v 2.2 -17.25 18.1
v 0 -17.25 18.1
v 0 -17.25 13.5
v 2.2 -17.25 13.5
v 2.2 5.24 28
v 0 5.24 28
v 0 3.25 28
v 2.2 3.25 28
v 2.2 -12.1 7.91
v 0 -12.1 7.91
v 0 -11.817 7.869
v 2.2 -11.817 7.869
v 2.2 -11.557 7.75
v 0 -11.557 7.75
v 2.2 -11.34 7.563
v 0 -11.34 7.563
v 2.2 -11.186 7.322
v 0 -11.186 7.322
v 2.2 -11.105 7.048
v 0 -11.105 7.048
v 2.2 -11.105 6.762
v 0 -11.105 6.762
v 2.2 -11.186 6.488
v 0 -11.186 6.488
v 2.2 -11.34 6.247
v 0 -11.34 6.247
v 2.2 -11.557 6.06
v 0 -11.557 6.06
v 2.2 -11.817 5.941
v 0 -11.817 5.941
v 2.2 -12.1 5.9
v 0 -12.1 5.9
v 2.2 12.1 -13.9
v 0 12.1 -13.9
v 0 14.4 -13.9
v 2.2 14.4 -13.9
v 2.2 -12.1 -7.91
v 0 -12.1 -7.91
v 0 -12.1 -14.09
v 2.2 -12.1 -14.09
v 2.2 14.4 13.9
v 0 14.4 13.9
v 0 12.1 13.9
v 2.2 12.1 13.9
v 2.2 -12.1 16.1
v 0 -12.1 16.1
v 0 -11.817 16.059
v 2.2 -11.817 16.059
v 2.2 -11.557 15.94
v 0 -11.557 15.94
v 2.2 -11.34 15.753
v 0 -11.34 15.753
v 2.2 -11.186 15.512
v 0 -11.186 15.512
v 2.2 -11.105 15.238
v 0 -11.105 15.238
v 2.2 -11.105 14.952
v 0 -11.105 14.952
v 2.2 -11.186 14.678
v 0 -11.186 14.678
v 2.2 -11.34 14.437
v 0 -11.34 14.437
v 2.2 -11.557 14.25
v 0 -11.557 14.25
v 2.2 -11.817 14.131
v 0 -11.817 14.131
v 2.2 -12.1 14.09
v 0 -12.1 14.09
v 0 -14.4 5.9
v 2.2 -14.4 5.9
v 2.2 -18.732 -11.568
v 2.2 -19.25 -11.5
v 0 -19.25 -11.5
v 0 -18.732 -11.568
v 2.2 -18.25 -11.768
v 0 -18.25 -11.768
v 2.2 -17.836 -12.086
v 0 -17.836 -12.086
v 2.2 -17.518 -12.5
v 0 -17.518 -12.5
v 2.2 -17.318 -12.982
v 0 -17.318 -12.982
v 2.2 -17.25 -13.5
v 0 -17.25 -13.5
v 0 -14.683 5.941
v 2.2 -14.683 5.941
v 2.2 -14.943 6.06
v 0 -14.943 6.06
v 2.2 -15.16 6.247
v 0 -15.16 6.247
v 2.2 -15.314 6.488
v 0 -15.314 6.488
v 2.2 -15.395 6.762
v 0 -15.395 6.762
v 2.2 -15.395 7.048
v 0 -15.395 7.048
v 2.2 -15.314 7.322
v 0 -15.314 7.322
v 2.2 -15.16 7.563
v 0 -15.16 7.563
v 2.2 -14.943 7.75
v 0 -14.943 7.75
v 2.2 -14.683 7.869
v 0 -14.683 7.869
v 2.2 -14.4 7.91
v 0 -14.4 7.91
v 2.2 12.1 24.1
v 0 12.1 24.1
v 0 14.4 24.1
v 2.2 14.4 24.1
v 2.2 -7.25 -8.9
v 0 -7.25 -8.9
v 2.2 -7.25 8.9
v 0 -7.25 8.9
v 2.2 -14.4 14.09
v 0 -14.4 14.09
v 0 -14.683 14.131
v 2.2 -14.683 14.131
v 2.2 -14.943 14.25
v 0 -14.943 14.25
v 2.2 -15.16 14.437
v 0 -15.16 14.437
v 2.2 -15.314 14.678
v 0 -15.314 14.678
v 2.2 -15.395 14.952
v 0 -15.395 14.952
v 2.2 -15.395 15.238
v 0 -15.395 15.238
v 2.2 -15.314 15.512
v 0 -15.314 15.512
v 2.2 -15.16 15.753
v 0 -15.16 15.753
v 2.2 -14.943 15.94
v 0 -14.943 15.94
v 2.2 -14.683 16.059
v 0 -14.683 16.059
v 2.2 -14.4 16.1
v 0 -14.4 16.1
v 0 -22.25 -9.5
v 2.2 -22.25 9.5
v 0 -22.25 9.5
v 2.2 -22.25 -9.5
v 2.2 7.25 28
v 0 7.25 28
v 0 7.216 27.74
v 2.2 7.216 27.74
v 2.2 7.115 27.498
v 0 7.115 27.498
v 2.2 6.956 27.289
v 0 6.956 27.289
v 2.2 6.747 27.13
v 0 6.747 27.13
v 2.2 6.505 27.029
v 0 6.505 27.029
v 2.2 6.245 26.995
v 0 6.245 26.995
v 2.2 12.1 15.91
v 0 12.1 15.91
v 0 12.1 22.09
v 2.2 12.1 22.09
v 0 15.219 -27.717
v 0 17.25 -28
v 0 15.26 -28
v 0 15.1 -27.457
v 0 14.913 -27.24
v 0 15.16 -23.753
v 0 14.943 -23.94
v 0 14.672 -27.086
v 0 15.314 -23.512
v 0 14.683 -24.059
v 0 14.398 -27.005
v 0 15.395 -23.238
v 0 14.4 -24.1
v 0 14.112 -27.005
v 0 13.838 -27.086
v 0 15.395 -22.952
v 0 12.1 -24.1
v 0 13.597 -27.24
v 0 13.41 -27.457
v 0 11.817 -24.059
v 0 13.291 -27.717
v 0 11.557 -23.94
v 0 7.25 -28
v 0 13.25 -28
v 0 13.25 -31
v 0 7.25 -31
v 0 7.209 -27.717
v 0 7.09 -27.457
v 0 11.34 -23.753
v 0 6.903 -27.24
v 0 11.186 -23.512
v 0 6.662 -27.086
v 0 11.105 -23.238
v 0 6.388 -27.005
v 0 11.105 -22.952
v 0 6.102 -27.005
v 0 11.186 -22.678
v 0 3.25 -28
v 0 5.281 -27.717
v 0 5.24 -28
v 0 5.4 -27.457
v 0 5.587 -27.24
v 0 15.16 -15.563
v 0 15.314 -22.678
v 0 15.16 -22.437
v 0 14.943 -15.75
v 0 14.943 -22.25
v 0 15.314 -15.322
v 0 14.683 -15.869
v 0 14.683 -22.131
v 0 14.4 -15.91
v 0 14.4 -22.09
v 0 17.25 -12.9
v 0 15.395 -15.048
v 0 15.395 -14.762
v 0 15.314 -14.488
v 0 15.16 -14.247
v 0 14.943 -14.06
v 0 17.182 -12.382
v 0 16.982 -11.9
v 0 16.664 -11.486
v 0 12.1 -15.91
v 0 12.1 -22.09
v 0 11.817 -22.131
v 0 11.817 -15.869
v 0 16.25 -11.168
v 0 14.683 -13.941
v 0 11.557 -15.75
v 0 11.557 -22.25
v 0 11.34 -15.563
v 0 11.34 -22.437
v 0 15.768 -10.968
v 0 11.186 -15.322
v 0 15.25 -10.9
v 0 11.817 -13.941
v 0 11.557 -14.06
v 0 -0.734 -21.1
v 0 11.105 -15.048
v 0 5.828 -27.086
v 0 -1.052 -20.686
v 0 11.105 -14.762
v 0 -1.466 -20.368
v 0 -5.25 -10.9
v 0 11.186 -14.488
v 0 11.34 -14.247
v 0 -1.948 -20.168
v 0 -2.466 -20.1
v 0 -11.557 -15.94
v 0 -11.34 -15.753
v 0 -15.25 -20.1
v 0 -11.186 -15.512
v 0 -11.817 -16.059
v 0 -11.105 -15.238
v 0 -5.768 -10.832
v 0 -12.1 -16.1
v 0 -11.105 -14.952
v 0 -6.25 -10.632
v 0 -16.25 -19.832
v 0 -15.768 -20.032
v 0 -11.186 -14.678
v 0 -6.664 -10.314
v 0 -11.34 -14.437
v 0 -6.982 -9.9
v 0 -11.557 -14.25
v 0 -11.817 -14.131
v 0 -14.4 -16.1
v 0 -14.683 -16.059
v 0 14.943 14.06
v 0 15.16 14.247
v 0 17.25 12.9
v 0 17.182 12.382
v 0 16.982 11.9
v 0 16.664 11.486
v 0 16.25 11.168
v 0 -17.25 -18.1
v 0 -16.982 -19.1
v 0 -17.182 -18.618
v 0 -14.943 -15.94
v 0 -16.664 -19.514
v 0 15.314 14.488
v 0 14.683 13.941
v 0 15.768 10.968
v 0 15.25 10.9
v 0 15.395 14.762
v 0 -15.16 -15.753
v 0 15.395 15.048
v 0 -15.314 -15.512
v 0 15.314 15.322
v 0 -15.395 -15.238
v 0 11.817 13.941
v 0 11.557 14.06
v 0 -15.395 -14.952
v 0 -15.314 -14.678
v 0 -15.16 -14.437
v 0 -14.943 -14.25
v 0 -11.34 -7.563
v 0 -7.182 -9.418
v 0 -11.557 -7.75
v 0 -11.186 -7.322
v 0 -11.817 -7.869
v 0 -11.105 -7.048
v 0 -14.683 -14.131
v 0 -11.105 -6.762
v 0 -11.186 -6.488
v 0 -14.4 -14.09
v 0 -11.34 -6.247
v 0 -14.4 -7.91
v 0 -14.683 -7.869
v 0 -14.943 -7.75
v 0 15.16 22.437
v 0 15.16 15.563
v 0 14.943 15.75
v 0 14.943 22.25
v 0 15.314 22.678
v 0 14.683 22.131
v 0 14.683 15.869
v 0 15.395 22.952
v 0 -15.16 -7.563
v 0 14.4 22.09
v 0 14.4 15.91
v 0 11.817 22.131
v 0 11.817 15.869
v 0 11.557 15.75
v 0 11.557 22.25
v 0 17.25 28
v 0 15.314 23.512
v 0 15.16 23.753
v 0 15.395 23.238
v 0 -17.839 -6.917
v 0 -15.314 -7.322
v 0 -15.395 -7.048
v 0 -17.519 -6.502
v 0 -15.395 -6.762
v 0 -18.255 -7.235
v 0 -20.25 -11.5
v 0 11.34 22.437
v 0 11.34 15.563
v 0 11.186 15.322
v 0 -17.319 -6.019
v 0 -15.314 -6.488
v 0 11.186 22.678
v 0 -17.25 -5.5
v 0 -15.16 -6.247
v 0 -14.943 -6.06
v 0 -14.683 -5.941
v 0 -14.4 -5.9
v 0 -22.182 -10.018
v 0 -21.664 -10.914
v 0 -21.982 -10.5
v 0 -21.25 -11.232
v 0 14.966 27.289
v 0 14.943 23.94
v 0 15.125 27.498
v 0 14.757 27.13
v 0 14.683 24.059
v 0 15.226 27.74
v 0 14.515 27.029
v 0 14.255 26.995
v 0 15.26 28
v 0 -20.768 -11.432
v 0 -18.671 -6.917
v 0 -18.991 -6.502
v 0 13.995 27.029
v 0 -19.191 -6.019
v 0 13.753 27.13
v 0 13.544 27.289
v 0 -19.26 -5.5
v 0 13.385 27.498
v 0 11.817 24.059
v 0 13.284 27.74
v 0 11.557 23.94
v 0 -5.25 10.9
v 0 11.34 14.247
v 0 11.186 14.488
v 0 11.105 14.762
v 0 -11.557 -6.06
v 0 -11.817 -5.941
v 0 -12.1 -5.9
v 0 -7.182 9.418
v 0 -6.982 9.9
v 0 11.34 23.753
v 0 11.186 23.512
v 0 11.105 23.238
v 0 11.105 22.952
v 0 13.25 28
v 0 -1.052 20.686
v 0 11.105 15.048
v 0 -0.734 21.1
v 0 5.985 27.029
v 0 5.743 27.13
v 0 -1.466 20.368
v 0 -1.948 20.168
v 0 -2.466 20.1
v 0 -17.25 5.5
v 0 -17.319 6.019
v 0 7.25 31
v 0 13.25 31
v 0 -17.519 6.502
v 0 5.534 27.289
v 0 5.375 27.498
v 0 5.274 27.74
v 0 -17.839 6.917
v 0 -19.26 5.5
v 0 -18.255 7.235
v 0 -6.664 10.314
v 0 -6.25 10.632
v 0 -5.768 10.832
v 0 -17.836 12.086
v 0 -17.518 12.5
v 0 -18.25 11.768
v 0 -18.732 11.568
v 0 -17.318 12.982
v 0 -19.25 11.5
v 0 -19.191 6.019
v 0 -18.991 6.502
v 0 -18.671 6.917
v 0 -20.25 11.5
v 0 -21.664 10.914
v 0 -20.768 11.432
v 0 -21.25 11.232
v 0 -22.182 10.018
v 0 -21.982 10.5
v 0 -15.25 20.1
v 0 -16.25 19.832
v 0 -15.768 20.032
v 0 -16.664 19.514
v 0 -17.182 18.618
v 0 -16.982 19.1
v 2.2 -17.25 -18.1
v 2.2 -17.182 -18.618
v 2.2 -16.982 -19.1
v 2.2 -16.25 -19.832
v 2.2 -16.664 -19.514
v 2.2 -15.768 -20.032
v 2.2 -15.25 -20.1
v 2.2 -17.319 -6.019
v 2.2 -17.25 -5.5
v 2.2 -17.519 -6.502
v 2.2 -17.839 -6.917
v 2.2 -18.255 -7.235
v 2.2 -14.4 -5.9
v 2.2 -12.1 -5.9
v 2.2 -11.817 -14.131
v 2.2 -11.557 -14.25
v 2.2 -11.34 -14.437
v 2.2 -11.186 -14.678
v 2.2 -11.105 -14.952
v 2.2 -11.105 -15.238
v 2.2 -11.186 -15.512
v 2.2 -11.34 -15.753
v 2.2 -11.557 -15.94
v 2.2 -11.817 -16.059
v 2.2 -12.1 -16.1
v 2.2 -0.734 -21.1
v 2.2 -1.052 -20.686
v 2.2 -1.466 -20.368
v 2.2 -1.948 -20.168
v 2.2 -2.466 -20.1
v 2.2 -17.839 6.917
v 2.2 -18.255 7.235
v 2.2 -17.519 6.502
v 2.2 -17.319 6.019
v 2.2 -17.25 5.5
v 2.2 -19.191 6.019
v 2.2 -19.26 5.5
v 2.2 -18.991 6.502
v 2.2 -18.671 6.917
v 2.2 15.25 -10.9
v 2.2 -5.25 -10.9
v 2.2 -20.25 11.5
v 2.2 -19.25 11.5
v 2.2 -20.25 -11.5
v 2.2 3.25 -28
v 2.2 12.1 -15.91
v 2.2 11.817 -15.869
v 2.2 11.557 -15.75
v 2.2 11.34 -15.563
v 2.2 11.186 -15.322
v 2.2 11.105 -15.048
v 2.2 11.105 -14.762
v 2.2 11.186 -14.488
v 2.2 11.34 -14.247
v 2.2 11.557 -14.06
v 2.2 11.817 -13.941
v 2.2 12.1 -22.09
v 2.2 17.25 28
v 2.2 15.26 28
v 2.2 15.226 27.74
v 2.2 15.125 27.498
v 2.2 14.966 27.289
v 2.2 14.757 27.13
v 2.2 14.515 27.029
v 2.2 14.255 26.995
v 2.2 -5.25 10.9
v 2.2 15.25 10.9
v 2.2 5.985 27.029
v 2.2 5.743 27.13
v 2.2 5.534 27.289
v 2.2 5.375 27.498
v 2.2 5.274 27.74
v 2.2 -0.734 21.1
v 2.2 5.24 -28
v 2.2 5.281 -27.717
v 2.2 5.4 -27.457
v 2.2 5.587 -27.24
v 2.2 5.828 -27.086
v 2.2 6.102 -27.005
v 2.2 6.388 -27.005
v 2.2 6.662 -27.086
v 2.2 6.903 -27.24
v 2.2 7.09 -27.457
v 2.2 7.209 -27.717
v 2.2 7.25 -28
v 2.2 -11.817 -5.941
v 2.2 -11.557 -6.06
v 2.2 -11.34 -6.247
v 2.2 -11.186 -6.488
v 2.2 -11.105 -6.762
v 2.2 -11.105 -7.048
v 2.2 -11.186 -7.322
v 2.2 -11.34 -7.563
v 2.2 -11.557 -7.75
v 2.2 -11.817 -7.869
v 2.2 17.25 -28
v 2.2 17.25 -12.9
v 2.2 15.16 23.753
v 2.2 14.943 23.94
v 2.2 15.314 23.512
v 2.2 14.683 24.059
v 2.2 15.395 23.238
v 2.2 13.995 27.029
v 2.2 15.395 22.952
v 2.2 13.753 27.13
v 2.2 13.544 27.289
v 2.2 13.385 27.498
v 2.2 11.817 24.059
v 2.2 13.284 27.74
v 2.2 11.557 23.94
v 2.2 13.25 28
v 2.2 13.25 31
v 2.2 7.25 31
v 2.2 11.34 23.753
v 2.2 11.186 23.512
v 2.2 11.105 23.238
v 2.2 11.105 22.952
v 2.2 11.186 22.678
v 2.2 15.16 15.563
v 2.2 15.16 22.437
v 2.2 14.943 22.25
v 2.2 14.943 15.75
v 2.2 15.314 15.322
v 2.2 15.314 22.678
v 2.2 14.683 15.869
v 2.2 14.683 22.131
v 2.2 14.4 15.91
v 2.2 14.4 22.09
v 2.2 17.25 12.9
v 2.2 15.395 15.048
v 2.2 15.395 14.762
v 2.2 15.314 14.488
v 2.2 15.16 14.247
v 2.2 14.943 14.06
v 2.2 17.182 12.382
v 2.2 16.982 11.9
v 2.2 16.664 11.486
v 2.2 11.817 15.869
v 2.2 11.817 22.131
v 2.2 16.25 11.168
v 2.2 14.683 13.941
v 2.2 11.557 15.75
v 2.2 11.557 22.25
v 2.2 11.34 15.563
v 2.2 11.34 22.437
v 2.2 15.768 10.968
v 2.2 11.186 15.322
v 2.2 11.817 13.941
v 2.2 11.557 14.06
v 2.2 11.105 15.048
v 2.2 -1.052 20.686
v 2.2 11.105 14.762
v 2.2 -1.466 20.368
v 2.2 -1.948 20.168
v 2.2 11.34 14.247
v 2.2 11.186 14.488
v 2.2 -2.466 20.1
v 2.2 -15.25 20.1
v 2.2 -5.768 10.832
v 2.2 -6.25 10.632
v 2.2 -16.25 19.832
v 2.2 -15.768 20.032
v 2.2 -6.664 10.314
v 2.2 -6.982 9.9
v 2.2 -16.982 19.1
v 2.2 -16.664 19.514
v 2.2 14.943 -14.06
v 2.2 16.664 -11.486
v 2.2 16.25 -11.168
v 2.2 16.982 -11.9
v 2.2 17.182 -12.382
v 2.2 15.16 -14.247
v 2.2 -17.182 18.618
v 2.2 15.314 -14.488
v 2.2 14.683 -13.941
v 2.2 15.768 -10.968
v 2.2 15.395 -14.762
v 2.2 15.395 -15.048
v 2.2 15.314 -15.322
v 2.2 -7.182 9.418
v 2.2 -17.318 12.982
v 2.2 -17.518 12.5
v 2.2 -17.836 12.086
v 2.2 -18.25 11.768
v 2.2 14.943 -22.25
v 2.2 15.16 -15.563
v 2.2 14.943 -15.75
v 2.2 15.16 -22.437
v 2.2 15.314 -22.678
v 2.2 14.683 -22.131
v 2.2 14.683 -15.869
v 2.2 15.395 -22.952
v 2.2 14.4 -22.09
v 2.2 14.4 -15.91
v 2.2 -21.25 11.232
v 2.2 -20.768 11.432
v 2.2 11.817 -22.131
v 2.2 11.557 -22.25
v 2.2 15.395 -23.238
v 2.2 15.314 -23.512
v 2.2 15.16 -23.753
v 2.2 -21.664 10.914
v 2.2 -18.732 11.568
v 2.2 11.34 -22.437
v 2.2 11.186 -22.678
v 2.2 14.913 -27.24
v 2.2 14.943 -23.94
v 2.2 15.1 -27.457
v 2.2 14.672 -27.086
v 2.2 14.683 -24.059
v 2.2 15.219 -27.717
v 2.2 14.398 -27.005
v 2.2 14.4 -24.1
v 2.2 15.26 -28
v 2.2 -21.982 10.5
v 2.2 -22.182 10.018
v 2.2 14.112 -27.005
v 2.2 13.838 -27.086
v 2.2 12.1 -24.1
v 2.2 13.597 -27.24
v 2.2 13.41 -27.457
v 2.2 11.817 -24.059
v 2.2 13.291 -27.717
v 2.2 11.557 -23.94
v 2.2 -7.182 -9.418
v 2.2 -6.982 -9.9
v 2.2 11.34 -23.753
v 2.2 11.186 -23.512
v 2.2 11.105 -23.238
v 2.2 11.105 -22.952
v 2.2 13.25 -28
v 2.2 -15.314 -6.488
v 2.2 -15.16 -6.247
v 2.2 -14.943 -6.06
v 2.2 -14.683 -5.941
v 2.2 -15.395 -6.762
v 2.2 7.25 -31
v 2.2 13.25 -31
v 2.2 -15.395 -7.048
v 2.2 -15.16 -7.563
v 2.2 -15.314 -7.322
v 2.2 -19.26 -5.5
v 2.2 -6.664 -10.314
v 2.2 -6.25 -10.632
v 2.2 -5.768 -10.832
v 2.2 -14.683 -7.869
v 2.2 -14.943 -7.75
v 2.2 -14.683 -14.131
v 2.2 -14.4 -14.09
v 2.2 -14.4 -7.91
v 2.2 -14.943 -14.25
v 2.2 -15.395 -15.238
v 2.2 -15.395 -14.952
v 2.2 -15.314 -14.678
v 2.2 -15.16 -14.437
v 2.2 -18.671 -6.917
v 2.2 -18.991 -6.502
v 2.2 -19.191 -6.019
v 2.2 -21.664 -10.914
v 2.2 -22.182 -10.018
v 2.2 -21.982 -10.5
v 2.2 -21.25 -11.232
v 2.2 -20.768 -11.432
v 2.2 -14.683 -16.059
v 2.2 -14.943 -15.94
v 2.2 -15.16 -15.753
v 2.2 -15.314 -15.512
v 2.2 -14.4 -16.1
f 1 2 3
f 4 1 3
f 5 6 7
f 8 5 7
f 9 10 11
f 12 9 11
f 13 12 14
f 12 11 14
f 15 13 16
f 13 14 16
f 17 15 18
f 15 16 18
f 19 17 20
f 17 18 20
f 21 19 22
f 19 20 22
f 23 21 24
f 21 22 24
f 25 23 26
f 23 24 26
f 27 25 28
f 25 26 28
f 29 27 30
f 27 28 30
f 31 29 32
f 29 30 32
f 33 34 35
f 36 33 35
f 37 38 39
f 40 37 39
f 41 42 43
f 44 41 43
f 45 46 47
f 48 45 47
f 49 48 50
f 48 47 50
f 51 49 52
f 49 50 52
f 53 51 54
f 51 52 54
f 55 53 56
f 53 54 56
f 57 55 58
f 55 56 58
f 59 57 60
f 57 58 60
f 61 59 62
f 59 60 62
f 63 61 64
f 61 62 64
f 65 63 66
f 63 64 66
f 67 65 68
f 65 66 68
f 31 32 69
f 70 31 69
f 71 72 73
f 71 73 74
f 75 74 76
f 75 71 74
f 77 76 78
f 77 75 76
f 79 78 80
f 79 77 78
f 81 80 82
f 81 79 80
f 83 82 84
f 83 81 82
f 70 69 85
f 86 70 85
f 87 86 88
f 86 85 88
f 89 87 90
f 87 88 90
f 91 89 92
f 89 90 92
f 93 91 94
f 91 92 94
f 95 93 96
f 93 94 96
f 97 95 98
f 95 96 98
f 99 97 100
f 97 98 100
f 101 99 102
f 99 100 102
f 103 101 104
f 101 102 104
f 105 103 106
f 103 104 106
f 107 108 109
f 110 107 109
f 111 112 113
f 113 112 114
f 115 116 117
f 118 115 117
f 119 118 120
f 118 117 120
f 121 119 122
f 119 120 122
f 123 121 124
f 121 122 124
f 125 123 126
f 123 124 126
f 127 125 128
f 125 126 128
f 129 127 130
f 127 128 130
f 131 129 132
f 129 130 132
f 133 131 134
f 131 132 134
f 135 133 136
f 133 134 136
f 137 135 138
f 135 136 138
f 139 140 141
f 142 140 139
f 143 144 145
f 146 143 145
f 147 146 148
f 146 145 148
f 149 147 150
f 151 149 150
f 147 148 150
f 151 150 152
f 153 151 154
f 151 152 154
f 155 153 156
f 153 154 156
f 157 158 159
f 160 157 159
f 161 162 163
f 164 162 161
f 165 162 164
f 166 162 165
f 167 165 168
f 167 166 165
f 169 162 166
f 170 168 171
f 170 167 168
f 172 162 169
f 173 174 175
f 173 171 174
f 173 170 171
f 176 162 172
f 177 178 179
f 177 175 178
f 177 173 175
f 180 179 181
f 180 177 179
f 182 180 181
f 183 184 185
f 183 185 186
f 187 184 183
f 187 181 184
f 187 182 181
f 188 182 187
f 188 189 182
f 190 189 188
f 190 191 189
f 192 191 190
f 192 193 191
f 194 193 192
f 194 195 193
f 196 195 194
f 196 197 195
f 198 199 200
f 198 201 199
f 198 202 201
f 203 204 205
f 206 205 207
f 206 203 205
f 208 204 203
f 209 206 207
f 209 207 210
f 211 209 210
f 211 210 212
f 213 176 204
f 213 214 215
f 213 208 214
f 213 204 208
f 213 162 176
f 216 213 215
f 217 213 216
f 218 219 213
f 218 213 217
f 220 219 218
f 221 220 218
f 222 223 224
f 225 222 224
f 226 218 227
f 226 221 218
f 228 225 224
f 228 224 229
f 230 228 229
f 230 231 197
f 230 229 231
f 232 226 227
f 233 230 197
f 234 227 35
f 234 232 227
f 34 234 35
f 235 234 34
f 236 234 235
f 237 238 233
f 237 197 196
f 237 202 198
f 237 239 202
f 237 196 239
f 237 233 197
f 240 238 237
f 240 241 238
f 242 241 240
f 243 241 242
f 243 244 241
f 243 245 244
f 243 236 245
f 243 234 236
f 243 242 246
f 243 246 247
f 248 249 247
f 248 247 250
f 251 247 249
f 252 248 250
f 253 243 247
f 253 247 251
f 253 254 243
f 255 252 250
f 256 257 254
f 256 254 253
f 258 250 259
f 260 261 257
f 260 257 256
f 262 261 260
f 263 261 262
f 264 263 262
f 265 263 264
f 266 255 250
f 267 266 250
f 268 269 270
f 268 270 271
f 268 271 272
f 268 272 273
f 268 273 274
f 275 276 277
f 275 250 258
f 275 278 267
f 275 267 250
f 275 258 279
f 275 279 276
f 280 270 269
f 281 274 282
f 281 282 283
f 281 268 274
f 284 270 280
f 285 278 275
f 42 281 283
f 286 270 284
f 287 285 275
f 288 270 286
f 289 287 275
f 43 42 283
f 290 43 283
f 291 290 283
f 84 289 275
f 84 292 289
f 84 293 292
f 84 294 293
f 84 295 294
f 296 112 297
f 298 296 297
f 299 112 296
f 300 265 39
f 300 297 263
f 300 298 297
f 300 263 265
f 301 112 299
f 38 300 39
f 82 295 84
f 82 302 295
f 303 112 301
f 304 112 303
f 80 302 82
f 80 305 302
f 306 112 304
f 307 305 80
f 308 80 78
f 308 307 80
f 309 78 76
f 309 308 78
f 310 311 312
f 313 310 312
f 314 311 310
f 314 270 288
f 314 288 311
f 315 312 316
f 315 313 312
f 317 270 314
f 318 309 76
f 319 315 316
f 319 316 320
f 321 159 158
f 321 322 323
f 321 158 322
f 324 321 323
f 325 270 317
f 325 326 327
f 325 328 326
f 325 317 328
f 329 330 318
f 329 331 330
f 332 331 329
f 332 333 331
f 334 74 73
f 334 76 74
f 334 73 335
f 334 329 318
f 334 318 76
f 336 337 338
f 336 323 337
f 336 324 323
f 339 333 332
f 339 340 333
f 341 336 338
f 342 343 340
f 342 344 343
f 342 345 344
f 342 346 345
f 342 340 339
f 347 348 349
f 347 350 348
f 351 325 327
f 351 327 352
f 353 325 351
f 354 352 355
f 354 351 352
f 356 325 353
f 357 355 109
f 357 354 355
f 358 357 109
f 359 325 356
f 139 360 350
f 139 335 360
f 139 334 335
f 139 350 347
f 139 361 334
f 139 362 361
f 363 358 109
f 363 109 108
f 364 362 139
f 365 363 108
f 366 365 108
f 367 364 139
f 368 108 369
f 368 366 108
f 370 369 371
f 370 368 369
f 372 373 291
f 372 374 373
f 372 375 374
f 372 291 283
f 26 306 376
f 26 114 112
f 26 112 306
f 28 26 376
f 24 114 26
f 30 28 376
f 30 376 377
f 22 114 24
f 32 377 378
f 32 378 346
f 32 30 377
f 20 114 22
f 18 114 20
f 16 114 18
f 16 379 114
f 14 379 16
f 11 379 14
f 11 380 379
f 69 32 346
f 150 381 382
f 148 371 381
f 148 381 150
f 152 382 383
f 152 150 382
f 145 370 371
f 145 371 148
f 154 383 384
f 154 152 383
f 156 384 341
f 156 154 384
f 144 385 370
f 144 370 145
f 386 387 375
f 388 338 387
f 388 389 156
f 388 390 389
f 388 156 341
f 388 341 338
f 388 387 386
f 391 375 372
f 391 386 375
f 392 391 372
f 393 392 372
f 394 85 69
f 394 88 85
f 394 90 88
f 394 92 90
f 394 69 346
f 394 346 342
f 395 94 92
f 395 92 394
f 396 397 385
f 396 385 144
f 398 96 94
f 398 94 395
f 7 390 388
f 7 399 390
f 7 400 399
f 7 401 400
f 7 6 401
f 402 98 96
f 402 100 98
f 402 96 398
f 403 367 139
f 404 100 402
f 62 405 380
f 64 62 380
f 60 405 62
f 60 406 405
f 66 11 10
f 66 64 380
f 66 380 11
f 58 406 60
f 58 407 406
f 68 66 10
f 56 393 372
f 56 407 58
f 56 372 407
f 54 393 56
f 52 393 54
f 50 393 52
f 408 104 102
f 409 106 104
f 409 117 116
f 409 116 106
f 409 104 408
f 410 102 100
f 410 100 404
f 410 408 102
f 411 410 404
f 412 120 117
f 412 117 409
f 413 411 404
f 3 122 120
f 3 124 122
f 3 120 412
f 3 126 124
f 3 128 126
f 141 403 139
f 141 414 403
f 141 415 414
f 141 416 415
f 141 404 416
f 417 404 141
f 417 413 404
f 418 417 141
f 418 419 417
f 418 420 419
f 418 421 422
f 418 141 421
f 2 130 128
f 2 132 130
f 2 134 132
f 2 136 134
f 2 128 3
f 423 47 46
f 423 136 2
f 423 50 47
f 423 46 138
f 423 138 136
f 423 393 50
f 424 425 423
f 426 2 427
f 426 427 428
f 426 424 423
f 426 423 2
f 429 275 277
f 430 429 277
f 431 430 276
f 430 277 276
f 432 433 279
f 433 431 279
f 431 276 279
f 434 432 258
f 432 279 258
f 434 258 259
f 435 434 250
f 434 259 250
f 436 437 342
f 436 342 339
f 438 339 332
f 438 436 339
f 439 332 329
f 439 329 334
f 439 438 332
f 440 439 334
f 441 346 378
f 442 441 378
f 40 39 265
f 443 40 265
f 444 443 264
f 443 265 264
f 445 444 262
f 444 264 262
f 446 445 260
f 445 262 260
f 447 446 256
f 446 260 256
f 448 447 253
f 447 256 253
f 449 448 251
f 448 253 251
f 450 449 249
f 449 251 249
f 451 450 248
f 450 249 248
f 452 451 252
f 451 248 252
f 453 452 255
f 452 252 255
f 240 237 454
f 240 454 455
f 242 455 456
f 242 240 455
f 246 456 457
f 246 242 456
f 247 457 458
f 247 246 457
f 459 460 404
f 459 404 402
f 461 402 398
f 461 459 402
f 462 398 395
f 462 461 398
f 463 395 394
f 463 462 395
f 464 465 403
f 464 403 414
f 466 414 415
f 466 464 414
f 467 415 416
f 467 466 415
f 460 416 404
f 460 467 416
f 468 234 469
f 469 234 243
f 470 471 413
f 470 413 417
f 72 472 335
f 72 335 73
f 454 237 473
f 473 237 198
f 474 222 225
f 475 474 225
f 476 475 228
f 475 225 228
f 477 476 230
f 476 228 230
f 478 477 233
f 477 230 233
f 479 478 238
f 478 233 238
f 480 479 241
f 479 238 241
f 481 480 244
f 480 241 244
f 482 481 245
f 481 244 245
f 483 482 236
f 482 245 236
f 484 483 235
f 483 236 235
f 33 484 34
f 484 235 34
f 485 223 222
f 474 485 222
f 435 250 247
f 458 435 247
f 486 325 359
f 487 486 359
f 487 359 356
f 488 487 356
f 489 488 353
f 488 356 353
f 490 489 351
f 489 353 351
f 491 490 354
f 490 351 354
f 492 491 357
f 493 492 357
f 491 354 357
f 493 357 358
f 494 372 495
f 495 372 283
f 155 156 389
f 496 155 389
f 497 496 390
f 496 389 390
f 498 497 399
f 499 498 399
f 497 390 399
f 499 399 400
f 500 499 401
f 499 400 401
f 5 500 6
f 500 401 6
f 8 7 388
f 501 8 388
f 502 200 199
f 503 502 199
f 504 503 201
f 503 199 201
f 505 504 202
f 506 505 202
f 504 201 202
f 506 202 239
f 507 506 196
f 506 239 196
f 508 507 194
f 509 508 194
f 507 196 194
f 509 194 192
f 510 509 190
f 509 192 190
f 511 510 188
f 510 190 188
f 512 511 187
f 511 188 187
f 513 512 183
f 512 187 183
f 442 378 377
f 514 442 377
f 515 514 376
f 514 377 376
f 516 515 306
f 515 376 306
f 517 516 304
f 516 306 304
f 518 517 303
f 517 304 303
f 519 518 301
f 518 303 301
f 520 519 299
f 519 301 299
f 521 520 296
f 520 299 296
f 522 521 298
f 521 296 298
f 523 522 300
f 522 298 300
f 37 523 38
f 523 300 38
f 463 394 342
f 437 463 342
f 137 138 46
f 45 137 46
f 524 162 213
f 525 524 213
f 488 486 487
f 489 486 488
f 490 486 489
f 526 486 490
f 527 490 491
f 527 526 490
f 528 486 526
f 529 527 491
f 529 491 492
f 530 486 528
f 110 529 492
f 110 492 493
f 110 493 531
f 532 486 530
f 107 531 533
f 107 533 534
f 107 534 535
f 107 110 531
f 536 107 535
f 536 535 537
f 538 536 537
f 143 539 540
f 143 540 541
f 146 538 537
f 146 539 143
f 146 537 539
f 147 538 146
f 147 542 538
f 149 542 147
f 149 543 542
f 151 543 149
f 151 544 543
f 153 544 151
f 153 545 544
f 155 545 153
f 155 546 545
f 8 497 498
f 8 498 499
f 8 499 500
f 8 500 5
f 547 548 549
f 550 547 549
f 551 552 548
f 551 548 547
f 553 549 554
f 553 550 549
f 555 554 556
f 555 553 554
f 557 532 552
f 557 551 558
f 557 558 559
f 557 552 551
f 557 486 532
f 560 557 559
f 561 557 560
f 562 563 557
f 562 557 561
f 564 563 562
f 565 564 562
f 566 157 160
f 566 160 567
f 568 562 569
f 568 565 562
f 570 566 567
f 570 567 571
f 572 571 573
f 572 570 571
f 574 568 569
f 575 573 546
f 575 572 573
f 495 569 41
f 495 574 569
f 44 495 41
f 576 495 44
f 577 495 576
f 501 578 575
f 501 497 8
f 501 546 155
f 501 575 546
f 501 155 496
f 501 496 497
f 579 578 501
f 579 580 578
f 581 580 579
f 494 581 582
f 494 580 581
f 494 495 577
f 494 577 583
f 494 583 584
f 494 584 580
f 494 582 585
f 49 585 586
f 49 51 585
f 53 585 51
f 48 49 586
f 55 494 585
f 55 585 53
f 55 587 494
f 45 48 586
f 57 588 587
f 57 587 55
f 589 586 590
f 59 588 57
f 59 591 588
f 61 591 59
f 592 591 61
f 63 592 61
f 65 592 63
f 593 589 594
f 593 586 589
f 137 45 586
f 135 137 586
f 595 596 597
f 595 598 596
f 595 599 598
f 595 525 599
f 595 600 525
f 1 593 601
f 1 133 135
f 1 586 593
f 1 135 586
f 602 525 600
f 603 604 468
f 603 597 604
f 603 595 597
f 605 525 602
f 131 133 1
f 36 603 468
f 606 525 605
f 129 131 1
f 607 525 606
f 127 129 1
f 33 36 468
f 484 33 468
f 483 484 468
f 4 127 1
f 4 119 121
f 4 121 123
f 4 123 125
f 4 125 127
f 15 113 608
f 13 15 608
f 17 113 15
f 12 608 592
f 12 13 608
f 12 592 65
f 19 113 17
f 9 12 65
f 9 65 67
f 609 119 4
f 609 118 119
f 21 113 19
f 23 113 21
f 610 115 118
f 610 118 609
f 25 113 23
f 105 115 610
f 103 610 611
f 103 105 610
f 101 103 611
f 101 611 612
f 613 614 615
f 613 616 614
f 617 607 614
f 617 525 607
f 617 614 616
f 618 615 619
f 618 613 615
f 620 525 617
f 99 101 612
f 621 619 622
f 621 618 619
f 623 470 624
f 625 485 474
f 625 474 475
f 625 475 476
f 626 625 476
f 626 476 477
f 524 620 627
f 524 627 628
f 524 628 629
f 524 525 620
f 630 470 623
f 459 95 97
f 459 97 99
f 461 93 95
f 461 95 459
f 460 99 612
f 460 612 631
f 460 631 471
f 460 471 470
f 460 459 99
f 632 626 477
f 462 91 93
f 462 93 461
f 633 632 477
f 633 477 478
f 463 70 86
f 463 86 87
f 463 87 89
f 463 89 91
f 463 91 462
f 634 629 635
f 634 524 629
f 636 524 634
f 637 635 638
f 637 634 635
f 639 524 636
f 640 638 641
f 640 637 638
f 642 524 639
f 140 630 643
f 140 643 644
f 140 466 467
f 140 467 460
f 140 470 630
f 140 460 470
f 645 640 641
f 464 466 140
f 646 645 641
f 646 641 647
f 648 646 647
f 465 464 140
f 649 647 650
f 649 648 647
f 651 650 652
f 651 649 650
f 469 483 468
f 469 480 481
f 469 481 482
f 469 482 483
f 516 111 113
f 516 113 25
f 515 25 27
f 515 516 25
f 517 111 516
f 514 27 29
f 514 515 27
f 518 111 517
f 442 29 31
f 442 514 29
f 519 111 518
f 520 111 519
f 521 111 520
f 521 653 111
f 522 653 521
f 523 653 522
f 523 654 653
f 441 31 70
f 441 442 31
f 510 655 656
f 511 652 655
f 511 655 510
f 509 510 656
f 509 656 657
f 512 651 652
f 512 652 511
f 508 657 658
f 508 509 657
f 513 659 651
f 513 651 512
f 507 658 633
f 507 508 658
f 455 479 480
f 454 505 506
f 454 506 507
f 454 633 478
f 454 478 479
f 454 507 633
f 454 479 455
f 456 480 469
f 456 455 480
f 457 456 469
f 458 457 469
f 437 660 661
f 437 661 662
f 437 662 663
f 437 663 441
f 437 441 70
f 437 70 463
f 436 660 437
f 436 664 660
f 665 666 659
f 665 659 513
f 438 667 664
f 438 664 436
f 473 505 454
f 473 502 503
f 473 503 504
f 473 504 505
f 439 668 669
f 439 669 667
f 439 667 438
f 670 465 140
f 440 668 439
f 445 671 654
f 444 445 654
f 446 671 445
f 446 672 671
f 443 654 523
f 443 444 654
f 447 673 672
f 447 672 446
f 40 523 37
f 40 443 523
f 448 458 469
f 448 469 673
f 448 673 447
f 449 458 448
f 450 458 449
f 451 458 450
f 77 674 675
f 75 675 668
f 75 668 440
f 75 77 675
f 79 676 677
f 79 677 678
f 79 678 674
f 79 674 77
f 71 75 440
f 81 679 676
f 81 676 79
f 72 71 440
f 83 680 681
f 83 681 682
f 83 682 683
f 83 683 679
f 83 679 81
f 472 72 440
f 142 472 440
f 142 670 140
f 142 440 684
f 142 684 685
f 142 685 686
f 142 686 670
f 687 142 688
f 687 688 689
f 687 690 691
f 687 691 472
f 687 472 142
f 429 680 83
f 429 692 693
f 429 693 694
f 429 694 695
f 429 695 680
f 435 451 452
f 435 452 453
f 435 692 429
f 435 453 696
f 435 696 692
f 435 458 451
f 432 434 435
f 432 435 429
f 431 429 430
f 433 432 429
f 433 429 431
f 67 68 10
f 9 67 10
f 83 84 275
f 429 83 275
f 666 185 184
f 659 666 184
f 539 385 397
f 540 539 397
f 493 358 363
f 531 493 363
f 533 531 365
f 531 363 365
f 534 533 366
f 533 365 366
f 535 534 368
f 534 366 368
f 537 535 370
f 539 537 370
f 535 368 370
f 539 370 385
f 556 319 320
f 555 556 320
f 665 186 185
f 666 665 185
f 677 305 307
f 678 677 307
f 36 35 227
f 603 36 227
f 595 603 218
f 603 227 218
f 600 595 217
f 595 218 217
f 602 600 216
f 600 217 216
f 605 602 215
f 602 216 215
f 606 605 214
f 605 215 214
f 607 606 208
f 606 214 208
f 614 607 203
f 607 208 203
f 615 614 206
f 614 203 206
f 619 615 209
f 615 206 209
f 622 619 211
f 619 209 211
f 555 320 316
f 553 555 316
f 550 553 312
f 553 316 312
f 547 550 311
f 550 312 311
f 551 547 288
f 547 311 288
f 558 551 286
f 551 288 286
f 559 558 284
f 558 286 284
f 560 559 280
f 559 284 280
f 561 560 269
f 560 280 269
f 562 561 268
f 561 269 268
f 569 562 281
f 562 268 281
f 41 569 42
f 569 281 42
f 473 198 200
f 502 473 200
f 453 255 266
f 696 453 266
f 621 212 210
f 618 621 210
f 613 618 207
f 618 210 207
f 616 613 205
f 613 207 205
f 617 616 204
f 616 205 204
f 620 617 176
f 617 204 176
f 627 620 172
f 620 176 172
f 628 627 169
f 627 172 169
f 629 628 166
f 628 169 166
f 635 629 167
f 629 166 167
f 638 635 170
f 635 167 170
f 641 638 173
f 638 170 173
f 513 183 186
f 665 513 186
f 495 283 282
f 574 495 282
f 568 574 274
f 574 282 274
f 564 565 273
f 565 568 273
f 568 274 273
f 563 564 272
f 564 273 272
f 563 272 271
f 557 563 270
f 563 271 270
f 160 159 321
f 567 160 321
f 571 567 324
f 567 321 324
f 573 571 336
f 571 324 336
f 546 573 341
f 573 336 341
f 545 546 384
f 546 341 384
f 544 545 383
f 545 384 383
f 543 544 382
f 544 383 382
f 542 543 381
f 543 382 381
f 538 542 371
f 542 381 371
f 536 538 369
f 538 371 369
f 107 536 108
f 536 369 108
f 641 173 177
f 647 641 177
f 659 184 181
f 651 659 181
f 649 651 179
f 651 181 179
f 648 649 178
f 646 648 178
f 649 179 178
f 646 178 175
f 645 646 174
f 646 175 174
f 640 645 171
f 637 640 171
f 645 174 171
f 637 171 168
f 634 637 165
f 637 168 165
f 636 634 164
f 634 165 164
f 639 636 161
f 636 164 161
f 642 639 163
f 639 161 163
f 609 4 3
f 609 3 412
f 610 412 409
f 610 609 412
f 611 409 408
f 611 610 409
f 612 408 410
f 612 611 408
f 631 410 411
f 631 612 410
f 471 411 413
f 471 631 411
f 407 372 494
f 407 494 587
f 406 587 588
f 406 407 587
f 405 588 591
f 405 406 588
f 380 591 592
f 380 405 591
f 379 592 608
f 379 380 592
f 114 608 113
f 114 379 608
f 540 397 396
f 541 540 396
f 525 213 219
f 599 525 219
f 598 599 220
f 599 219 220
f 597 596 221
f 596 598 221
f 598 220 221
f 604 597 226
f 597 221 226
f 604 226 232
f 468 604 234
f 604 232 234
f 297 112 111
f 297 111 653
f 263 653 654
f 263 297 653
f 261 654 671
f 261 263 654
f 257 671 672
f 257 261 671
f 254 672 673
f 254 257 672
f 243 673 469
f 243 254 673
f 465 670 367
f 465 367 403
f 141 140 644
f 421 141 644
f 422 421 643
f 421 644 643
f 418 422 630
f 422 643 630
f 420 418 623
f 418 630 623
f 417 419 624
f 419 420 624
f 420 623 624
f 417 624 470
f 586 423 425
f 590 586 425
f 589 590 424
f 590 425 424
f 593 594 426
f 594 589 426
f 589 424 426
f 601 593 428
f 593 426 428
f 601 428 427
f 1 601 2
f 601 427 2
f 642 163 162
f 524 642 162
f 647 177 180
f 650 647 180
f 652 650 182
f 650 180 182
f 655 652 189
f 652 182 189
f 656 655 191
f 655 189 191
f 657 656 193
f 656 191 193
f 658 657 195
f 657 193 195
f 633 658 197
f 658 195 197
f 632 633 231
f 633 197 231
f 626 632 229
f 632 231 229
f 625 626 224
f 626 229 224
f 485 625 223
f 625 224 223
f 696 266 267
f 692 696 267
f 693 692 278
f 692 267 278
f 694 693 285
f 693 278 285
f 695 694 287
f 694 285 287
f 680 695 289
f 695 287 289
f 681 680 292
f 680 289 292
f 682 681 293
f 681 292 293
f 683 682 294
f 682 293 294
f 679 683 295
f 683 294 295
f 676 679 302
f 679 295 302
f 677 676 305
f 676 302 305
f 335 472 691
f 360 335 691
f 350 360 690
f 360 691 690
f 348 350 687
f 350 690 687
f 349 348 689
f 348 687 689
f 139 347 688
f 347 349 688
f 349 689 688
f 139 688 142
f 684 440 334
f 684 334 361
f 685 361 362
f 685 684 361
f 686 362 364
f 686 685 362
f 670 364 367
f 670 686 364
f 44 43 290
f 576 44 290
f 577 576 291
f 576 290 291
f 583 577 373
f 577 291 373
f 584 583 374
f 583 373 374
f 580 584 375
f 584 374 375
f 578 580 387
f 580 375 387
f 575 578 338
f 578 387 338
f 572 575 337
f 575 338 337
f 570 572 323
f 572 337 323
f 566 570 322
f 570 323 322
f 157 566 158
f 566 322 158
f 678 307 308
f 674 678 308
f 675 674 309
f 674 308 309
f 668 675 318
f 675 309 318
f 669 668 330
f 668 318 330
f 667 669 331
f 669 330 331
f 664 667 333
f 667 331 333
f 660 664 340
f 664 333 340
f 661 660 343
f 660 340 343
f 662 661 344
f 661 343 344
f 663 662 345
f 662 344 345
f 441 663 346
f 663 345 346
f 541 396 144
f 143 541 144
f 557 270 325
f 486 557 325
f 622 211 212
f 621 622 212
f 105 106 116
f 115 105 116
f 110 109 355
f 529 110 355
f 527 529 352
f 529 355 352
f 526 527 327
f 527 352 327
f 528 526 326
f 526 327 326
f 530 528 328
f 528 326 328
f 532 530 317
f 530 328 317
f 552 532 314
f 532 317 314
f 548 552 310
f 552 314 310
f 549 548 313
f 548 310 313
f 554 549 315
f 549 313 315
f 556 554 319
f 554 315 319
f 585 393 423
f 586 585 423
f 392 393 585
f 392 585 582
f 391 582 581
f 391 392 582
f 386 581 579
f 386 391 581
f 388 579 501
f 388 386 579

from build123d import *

# Parameters (mm, degrees)
EXTRUDE_1_DEPTH = 2.2
EXTRUDE_2_DEPTH = 2.2
FILLET_1_R      = 2


with BuildPart() as part:
    # 草图1 → 凸台-拉伸1 (new body)
    with BuildSketch(Plane(origin=(0, 0, 0), x_dir=(0, 0, -1), z_dir=(1, 0, 0))):
        with BuildLine():
            Line((-20.1, -17.25), (20.1, -17.25))
            Line((20.1, -17.25), (20.1, -1.311067127))
            Line((20.1, -1.311067127), (28, 3.25))
            Line((28, 3.25), (28, 5.24))
            ThreePointArc((28, 5.24), (26.995, 6.245), (28, 7.25))
            Line((28, 7.25), (31, 7.25))
            Line((31, 7.25), (31, 13.25))
            Line((31, 13.25), (28, 13.25))
            ThreePointArc((28, 13.25), (26.995, 14.255), (28, 15.26))
            Line((28, 15.26), (28, 17.25))
            Line((28, 17.25), (10.9, 17.25))
            Line((10.9, 17.25), (10.9, -7.25))
            Line((10.9, -7.25), (-10.9, -7.25))
            Line((-10.9, -7.25), (-10.9, 17.25))
            Line((-10.9, 17.25), (-28, 17.25))
            Line((-28, 17.25), (-28, 15.26))
            ThreePointArc((-28, 15.26), (-27.289357685, 14.965642315), (-26.995, 14.255))
            ThreePointArc((-26.995, 14.255), (-27.289357685, 13.544357685), (-28, 13.25))
            Line((-28, 13.25), (-31, 13.25))
            Line((-31, 13.25), (-31, 7.25))
            Line((-31, 7.25), (-28, 7.25))
            ThreePointArc((-28, 7.25), (-27.289357685, 6.955642315), (-26.995, 6.245))
            ThreePointArc((-26.995, 6.245), (-27.289357685, 5.534357685), (-28, 5.24))
            Line((-28, 5.24), (-28, 3.25))
            Line((-28, 3.25), (-20.1, -1.311067127))
            Line((-20.1, -1.311067127), (-20.1, -17.25))
        make_face()
        with BuildLine():
            Line((-7.91, -14.4), (-14.09, -14.4))
            ThreePointArc((-14.09, -14.4), (-15.095, -15.405), (-16.1, -14.4))
            Line((-16.1, -14.4), (-16.1, -12.1))
            ThreePointArc((-16.1, -12.1), (-15.095, -11.095), (-14.09, -12.1))
            Line((-14.09, -12.1), (-7.91, -12.1))
            ThreePointArc((-7.91, -12.1), (-6.905, -11.095), (-5.9, -12.1))
            Line((-5.9, -12.1), (-5.9, -14.4))
            ThreePointArc((-5.9, -14.4), (-6.905, -15.405), (-7.91, -14.4))
        make_face(mode=Mode.SUBTRACT)
        with BuildLine():
            Line((16.1, -12.1), (16.1, -14.4))
            ThreePointArc((16.1, -14.4), (15.095, -15.405), (14.09, -14.4))
            Line((14.09, -14.4), (7.91, -14.4))
            ThreePointArc((7.91, -14.4), (6.905, -15.405), (5.9, -14.4))
            Line((5.9, -14.4), (5.9, -12.1))
            ThreePointArc((5.9, -12.1), (6.905, -11.095), (7.91, -12.1))
            Line((7.91, -12.1), (14.09, -12.1))
            ThreePointArc((14.09, -12.1), (15.095, -11.095), (16.1, -12.1))
        make_face(mode=Mode.SUBTRACT)
        with BuildLine():
            Line((-15.91, 12.1), (-22.09, 12.1))
            ThreePointArc((-22.09, 12.1), (-23.095, 11.095), (-24.1, 12.1))
            Line((-24.1, 12.1), (-24.1, 14.4))
            ThreePointArc((-24.1, 14.4), (-23.095, 15.405), (-22.09, 14.4))
            Line((-22.09, 14.4), (-15.91, 14.4))
            ThreePointArc((-15.91, 14.4), (-14.905, 15.405), (-13.9, 14.4))
            Line((-13.9, 14.4), (-13.9, 12.1))
            ThreePointArc((-13.9, 12.1), (-14.905, 11.095), (-15.91, 12.1))
        make_face(mode=Mode.SUBTRACT)
        with BuildLine():
            Line((13.9, 12.1), (13.9, 14.4))
            ThreePointArc((13.9, 14.4), (14.905, 15.405), (15.91, 14.4))
            Line((15.91, 14.4), (22.09, 14.4))
            ThreePointArc((22.09, 14.4), (23.095, 15.405), (24.1, 14.4))
            Line((24.1, 14.4), (24.1, 12.1))
            ThreePointArc((24.1, 12.1), (23.095, 11.095), (22.09, 12.1))
            Line((22.09, 12.1), (15.91, 12.1))
            ThreePointArc((15.91, 12.1), (14.905, 11.095), (13.9, 12.1))
        make_face(mode=Mode.SUBTRACT)
    extrude(amount=EXTRUDE_1_DEPTH)

    # 草图2 → 凸台-拉伸2 (add)
    with BuildSketch(Plane(origin=(2.2, 0, 0), x_dir=(0, 0, -1), z_dir=(1, 0, 0))):
        Polygon((-11.5, -17.25), (-11.5, -22.25), (11.5, -22.25), (11.5, -17.25), (7.5, -17.25), (7.5, -19.26), (-7.5, -19.26), (-7.5, -17.25), align=None)
    extrude(amount=-EXTRUDE_2_DEPTH)

    # 圆角1
    # the kernel refuses this fillet: 2 mm, written as the material it adds along each edge
    with BuildSketch(Plane(origin=(0, -1.311067127, -20.1), x_dir=(0, -1, 0), z_dir=(1, 0, 0)), Plane(origin=(0, -1.311067127, 20.1), x_dir=(0, 0.49999999999999634, 0.8660254037844408), z_dir=(1, 0, 0))) as fillet_1_piece_1:
        with BuildLine():
            CenterArc((FILLET_1_R * 0.57735026919, FILLET_1_R), FILLET_1_R, 210, 60)
            Line((-FILLET_1_R * 0.288675134595, FILLET_1_R * 0.5), (0, 0))
            Line((0, 0), (FILLET_1_R * 0.57735026919, 0))
        make_face()
    extrude(amount=2.2)
    with BuildSketch(Plane(origin=(0, -7.25, -10.9), x_dir=(0, 1, 0), z_dir=(1, 0, 0)), Plane(origin=(0, -7.25, 10.9), x_dir=(0, 0, -1), z_dir=(1, 0, 0)), Plane(origin=(2.2, -17.25, 7.5), x_dir=(0, 0, -1), z_dir=(-1, 0, 0)), Plane(origin=(2.2, -17.25, -11.5), x_dir=(0, 0, -1), z_dir=(-1, 0, 0))) as fillet_1_piece_2:
        with BuildLine():
            CenterArc((FILLET_1_R, FILLET_1_R), FILLET_1_R, 180, 90)
            Line((0, FILLET_1_R), (0, 0))
            Line((0, 0), (FILLET_1_R, 0))
        make_face()
    extrude(amount=2.2)
    with BuildSketch(Plane(origin=(2.2, -19.26, -7.5), x_dir=(0, 1, 0), z_dir=(-1, 0, 0)), Plane(origin=(2.2, -19.26, 7.5), x_dir=(0, 0, -1), z_dir=(-1, 0, 0)), Plane(origin=(2.2, -17.25, -7.5), x_dir=(0, 0, 1), z_dir=(-1, 0, 0)), Plane(origin=(2.2, -17.25, 11.5), x_dir=(0, 0, 1), z_dir=(-1, 0, 0))) as fillet_1_piece_3:
        with BuildLine():
            CenterArc((FILLET_1_R, -FILLET_1_R), FILLET_1_R, 90, 90)
            Line((0, -FILLET_1_R), (0, 0))
            Line((0, 0), (FILLET_1_R, 0))
        make_face()
    extrude(amount=2.2)
    # the kernel refuses this fillet: 2 mm, written as the material it takes off along each edge
    with BuildSketch(Plane(origin=(-5, -17.25, 20.1), x_dir=(0, 1, 0), z_dir=(1, 0, 0)), Plane(origin=(-5, -17.25, -20.1), x_dir=(0, 0, 1), z_dir=(1, 0, 0)), Plane(origin=(-5, 17.25, -10.9), x_dir=(0, 0, -1), z_dir=(1, 0, 0)), Plane(origin=(-5, 17.25, 10.9), x_dir=(0, -1, 0), z_dir=(1, 0, 0))) as fillet_1_2_piece_1:
        with BuildLine():
            CenterArc((FILLET_1_R, -FILLET_1_R), FILLET_1_R, 90, 90)
            Line((0, -FILLET_1_R), (0, 0))
            Line((0, 0), (FILLET_1_R, 0))
        make_face()
    extrude(amount=12.2, mode=Mode.SUBTRACT)
    with BuildSketch(Plane(origin=(7.2, -22.25, -11.5), x_dir=(0, 0, 1), z_dir=(-1, 0, 0)), Plane(origin=(7.2, -22.25, 11.5), x_dir=(0, 1, 0), z_dir=(-1, 0, 0))) as fillet_1_2_piece_2:
        with BuildLine():
            CenterArc((FILLET_1_R, FILLET_1_R), FILLET_1_R, 180, 90)
            Line((0, FILLET_1_R), (0, 0))
            Line((0, 0), (FILLET_1_R, 0))
        make_face()
    extrude(amount=12.2, mode=Mode.SUBTRACT)


solid = part.part
